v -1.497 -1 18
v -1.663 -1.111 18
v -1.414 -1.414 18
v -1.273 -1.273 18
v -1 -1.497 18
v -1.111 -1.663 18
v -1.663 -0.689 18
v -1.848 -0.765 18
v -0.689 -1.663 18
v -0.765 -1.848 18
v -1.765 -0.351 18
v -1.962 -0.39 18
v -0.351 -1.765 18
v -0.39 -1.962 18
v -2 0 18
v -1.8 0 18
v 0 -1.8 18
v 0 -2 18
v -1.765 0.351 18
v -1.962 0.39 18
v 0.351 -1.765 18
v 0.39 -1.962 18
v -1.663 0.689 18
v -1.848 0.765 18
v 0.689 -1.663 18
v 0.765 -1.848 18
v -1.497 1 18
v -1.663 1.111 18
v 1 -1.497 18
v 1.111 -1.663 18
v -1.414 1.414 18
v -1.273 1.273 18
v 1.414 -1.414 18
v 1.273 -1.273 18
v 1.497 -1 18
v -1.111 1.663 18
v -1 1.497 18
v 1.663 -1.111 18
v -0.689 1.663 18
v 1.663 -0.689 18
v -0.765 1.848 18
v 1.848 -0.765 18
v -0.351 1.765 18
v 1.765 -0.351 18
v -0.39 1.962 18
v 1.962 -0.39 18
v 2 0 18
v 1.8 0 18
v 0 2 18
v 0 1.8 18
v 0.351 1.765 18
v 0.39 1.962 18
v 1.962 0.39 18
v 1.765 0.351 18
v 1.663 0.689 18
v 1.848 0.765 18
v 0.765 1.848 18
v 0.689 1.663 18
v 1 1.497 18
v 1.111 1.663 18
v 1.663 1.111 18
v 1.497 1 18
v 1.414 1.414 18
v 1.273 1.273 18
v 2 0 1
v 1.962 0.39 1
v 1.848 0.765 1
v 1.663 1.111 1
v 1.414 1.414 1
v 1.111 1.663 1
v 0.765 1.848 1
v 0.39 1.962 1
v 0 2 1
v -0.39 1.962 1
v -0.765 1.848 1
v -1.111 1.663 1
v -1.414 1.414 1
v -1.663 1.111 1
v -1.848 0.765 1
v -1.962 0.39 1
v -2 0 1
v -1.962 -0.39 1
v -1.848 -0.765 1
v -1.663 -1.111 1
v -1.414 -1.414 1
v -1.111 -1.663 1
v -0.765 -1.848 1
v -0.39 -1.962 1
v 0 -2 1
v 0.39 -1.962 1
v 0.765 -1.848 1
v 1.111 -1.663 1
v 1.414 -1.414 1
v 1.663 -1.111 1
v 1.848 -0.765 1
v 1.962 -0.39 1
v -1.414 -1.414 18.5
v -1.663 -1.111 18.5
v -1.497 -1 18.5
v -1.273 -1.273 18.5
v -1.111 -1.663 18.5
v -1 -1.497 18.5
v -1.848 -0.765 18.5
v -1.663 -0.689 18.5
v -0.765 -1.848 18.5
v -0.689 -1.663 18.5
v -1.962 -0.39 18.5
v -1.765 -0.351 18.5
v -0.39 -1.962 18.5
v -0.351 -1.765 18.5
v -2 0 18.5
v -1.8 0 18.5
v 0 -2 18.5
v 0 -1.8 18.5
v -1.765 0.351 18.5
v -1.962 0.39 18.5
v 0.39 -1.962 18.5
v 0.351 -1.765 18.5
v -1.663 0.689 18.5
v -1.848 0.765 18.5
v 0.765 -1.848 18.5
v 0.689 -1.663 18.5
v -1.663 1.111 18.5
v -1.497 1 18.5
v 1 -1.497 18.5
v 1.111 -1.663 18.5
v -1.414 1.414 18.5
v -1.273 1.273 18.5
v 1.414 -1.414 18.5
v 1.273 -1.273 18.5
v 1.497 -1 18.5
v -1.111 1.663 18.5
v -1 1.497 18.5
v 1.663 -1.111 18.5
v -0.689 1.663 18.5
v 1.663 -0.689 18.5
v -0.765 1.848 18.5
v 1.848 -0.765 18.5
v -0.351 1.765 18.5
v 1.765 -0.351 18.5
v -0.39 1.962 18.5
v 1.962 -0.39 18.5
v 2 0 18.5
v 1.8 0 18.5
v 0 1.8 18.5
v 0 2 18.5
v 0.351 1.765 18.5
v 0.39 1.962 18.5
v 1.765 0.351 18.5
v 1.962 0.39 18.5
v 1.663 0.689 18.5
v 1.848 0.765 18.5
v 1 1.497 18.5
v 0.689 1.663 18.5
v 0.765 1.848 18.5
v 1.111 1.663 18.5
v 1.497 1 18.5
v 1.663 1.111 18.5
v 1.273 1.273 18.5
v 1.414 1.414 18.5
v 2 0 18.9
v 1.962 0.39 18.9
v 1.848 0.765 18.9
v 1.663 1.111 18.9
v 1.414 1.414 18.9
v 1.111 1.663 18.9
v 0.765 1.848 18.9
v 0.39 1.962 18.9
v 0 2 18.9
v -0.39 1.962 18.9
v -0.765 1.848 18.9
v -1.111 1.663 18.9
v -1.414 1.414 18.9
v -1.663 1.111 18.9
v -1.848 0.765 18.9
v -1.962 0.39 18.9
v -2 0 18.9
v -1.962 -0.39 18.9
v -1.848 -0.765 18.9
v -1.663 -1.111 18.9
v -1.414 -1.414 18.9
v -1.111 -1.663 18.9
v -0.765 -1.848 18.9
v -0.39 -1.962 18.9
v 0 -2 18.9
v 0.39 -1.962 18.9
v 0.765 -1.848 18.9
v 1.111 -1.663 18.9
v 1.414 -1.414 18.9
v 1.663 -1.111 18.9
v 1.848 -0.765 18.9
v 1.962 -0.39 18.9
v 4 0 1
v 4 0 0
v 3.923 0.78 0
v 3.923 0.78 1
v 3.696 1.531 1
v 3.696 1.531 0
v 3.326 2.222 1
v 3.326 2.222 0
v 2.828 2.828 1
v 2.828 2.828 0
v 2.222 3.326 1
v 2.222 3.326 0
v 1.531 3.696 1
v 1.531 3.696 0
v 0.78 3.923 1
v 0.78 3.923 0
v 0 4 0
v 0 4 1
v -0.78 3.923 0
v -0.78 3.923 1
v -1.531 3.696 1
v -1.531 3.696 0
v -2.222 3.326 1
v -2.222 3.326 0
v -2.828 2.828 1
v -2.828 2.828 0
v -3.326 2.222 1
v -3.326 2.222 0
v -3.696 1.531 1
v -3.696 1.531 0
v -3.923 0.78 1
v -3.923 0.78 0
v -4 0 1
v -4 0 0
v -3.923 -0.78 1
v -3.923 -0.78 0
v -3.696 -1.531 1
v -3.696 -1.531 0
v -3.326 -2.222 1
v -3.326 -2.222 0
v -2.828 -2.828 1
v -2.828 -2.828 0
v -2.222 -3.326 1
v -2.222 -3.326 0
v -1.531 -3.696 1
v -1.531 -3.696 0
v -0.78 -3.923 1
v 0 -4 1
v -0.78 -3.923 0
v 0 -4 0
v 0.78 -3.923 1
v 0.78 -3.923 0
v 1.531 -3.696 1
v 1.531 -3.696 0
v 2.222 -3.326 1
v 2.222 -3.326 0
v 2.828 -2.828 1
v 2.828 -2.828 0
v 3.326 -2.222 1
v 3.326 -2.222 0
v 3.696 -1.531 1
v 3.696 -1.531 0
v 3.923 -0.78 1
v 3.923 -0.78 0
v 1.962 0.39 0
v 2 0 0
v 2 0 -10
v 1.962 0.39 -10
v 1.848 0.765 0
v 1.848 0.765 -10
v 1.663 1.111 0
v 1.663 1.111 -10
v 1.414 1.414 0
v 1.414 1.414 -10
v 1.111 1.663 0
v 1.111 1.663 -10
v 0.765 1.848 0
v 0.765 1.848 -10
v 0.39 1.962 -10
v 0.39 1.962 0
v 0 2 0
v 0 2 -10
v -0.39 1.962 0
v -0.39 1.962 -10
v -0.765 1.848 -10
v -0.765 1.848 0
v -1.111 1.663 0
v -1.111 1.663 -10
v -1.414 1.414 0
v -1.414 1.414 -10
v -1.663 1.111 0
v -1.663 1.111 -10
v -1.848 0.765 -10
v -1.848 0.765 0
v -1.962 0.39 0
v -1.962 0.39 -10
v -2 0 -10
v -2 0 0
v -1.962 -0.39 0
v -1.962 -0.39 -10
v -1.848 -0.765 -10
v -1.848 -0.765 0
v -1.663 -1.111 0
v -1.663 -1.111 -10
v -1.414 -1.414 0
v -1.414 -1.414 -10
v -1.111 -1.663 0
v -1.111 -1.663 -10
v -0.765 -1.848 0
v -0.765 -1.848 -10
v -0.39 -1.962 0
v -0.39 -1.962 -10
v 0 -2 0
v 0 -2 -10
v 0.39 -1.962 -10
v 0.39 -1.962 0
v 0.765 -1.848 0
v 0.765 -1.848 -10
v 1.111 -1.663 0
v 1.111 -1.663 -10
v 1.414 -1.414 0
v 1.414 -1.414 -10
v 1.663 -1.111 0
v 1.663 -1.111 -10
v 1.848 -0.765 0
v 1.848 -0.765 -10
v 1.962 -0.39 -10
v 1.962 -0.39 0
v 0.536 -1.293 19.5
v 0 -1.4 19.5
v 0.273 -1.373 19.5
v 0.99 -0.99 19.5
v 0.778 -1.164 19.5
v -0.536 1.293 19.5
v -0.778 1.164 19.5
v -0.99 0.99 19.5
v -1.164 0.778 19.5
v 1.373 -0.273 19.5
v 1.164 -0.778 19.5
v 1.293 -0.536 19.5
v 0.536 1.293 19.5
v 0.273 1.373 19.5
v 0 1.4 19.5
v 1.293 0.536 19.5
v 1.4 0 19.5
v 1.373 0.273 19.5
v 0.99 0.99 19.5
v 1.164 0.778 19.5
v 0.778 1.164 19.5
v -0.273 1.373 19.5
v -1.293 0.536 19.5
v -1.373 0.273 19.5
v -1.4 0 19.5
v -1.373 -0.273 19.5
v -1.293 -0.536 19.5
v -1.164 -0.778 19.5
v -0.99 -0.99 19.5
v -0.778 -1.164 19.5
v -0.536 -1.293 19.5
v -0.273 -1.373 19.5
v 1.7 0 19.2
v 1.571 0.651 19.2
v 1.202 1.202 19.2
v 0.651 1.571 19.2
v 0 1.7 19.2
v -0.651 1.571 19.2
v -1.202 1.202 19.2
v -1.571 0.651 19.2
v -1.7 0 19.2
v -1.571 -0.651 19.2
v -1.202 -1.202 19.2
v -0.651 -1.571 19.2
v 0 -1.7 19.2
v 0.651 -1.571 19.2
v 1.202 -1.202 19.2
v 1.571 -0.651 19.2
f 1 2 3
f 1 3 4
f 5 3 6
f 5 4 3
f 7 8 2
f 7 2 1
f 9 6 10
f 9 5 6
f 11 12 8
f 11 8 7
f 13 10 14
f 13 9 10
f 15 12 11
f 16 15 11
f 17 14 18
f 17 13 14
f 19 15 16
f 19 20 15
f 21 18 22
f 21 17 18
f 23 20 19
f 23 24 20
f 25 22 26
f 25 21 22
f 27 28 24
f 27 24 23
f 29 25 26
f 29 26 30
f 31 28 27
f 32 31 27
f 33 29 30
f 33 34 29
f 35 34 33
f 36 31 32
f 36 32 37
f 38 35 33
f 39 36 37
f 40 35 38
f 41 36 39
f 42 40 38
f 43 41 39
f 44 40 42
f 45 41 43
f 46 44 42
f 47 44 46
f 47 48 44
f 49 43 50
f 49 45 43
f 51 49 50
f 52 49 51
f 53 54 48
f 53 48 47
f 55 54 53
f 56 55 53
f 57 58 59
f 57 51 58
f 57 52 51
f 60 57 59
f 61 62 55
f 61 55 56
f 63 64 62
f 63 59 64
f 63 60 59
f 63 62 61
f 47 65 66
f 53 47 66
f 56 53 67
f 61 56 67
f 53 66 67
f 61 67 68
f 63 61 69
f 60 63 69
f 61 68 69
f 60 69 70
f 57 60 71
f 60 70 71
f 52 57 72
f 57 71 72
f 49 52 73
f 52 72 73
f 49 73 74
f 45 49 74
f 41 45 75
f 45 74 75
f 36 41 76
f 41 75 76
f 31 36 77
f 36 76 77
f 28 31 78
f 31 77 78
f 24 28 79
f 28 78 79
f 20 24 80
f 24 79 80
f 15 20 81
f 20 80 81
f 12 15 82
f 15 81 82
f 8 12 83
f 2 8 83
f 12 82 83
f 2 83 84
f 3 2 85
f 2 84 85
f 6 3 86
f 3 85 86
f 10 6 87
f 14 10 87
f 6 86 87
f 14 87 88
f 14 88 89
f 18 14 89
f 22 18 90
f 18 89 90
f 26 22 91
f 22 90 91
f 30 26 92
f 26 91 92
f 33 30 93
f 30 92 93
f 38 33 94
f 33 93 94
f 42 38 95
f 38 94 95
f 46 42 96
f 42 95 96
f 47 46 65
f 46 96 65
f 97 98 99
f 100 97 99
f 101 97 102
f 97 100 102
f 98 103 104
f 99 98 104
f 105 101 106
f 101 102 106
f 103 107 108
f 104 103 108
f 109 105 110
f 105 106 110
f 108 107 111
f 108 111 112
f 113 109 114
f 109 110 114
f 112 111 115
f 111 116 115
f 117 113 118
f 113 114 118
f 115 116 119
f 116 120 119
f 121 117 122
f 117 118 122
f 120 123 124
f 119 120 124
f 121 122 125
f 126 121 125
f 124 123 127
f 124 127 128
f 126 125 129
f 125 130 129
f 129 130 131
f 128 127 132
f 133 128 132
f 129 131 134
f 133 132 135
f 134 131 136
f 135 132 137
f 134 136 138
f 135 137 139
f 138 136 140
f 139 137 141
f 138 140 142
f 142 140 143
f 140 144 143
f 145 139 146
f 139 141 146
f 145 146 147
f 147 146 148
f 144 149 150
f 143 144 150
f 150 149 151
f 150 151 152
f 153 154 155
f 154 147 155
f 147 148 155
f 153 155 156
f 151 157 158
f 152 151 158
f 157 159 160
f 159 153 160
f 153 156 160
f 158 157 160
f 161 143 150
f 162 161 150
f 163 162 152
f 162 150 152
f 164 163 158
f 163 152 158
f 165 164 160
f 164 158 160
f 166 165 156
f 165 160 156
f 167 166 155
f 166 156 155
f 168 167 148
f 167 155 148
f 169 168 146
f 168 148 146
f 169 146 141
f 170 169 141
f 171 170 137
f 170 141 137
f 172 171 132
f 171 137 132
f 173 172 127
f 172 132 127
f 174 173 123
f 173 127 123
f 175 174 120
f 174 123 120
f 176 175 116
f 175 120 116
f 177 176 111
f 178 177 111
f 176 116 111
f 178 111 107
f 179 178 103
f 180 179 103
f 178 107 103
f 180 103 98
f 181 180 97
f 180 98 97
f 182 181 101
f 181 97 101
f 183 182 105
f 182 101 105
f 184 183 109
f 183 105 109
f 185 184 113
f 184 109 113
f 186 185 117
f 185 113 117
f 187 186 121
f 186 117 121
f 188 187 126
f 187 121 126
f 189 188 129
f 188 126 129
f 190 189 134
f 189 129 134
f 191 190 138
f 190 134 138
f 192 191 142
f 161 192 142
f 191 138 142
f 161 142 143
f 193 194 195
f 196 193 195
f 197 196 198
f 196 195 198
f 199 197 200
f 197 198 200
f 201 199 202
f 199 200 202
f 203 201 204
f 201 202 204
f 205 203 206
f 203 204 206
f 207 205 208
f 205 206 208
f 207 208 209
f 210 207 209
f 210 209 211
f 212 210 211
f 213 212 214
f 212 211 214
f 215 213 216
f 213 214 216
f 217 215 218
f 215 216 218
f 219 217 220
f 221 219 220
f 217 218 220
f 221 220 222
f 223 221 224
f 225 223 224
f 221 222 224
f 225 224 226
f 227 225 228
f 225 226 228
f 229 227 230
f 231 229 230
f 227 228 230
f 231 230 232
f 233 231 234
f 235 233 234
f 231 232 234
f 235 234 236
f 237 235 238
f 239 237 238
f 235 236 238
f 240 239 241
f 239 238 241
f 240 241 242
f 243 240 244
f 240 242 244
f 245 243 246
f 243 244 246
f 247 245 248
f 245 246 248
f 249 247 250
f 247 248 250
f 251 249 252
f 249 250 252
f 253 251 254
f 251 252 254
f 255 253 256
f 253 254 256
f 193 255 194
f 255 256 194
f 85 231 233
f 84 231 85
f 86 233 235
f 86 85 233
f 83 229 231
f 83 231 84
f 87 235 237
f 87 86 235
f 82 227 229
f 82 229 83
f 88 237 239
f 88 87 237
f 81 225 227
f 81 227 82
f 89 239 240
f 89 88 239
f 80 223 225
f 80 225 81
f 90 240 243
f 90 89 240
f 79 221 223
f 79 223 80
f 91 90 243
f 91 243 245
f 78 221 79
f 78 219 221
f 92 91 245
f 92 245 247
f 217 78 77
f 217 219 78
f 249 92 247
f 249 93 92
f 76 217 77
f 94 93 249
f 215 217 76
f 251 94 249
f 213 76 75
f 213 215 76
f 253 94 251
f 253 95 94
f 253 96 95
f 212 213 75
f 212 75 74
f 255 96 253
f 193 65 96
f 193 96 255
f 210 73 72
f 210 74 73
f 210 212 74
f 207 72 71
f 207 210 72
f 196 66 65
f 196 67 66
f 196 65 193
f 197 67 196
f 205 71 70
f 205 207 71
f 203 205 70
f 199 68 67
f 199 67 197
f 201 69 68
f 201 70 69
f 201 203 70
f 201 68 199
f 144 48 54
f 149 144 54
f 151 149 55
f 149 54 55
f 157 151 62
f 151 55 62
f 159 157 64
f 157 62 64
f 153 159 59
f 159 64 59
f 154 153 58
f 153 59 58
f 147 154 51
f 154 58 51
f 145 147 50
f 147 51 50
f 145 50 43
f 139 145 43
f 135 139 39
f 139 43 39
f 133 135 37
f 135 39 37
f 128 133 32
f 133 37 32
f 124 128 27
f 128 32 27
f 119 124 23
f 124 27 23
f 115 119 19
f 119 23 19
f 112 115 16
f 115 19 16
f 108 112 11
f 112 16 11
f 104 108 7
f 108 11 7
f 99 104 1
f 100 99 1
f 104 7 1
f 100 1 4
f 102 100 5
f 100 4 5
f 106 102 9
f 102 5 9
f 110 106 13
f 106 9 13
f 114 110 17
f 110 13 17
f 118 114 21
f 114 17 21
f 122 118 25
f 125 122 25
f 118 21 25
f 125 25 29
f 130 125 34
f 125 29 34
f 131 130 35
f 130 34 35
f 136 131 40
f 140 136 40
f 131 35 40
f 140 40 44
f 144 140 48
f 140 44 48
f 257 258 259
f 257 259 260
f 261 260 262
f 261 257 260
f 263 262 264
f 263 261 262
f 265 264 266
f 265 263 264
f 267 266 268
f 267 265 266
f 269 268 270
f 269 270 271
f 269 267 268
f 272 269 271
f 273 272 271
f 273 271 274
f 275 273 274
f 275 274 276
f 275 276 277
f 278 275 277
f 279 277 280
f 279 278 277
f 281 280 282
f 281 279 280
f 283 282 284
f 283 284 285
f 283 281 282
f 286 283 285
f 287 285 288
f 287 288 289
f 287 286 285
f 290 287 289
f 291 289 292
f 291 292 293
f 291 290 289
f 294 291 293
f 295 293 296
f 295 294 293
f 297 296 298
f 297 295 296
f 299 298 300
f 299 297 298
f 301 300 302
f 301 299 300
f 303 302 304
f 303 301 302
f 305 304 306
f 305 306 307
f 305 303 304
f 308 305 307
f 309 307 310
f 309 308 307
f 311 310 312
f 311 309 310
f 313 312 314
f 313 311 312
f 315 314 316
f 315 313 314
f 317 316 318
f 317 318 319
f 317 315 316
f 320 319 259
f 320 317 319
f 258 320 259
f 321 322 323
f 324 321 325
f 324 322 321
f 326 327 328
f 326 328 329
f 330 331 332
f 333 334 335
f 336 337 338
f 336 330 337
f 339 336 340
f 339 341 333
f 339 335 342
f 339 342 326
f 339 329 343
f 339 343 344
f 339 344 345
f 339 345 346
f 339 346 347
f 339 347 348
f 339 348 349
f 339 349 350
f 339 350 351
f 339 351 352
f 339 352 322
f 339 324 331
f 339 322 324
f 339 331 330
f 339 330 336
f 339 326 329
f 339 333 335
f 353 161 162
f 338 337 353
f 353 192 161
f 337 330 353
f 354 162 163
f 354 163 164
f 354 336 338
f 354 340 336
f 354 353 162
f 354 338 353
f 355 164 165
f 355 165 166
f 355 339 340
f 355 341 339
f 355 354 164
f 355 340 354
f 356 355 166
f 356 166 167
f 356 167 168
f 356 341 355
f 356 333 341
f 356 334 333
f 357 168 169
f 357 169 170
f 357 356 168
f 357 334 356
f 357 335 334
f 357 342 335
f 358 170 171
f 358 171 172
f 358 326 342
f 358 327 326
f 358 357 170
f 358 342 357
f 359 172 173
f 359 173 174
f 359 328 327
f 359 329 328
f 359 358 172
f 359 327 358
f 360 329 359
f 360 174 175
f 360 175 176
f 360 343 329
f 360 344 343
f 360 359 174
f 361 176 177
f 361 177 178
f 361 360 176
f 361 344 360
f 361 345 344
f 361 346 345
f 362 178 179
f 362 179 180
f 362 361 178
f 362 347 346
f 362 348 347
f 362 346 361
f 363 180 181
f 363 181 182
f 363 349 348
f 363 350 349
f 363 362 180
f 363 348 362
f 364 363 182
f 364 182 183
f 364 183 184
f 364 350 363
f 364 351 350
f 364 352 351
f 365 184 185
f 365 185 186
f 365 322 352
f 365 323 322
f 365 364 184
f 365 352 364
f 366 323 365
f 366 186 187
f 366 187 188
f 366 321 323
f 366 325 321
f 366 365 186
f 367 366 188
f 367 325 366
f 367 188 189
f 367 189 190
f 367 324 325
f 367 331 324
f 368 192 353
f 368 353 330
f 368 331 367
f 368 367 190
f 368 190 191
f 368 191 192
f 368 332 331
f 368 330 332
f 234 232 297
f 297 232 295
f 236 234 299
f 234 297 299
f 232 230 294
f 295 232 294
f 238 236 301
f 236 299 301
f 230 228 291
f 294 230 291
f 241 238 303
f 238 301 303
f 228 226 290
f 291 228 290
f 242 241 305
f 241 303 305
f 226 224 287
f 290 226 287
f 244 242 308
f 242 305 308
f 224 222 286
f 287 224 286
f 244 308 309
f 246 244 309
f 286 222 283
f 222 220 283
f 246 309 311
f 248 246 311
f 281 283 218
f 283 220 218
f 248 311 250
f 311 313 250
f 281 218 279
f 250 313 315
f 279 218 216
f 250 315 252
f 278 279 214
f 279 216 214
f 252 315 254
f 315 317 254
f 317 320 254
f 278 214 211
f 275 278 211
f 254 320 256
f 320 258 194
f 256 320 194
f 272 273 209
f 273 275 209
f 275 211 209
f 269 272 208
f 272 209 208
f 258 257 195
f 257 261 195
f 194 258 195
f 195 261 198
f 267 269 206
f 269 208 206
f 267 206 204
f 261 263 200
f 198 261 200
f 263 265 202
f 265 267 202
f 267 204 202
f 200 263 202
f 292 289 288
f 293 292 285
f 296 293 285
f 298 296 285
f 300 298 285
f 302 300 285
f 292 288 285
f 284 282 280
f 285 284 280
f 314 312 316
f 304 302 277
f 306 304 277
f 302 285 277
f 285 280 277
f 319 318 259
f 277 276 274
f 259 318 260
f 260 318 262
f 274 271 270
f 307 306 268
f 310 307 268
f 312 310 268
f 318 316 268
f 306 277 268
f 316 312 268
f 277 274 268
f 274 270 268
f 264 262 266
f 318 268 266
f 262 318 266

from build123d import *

# Parameters (mm, degrees)
F0_R     = 2
F1_DEPTH = 10
F2_R     = 4
F3_DEPTH = 1
F4_R     = 2
F5_DEPTH = 17
F6_R     = 1.8
F7_DEPTH = 0.5
F8_R     = 2
F8_R_2   = 1.8
F9_DEPTH = 1
F10_SIZE = 0.6


with BuildPart() as f1:
    # F0 (on Top) → F1 (new body)
    with BuildSketch(Plane.XY):
        Circle(F0_R)
    extrude(amount=-F1_DEPTH)

    # F2 (on Top) → F3 (join)
    with BuildSketch(Plane.XY):
        Circle(F2_R)
    extrude(amount=F3_DEPTH)

    # F4 (on face) → F5 (join)
    with BuildSketch(Plane.XY.offset(1)):
        Circle(F4_R)
    extrude(amount=F5_DEPTH)

    # F6 (on face) → F7 (join)
    with BuildSketch(Plane.XY.offset(18)):
        Circle(F6_R)
    extrude(amount=F7_DEPTH)

    # F8 (on face) → F9 (join)
    with BuildSketch(Plane.XY.offset(18.5)):
        Circle(F8_R)
        Circle(F8_R_2, mode=Mode.SUBTRACT)
        Circle(F8_R_2)
    extrude(amount=F9_DEPTH)

    # F10
    f10_edges = [f1.edges().sort_by_distance(p)[0] for p in [
        (-2, 0, 19.5),
    ]]
    chamfer(f10_edges, length=F10_SIZE)


solid = f1.part
